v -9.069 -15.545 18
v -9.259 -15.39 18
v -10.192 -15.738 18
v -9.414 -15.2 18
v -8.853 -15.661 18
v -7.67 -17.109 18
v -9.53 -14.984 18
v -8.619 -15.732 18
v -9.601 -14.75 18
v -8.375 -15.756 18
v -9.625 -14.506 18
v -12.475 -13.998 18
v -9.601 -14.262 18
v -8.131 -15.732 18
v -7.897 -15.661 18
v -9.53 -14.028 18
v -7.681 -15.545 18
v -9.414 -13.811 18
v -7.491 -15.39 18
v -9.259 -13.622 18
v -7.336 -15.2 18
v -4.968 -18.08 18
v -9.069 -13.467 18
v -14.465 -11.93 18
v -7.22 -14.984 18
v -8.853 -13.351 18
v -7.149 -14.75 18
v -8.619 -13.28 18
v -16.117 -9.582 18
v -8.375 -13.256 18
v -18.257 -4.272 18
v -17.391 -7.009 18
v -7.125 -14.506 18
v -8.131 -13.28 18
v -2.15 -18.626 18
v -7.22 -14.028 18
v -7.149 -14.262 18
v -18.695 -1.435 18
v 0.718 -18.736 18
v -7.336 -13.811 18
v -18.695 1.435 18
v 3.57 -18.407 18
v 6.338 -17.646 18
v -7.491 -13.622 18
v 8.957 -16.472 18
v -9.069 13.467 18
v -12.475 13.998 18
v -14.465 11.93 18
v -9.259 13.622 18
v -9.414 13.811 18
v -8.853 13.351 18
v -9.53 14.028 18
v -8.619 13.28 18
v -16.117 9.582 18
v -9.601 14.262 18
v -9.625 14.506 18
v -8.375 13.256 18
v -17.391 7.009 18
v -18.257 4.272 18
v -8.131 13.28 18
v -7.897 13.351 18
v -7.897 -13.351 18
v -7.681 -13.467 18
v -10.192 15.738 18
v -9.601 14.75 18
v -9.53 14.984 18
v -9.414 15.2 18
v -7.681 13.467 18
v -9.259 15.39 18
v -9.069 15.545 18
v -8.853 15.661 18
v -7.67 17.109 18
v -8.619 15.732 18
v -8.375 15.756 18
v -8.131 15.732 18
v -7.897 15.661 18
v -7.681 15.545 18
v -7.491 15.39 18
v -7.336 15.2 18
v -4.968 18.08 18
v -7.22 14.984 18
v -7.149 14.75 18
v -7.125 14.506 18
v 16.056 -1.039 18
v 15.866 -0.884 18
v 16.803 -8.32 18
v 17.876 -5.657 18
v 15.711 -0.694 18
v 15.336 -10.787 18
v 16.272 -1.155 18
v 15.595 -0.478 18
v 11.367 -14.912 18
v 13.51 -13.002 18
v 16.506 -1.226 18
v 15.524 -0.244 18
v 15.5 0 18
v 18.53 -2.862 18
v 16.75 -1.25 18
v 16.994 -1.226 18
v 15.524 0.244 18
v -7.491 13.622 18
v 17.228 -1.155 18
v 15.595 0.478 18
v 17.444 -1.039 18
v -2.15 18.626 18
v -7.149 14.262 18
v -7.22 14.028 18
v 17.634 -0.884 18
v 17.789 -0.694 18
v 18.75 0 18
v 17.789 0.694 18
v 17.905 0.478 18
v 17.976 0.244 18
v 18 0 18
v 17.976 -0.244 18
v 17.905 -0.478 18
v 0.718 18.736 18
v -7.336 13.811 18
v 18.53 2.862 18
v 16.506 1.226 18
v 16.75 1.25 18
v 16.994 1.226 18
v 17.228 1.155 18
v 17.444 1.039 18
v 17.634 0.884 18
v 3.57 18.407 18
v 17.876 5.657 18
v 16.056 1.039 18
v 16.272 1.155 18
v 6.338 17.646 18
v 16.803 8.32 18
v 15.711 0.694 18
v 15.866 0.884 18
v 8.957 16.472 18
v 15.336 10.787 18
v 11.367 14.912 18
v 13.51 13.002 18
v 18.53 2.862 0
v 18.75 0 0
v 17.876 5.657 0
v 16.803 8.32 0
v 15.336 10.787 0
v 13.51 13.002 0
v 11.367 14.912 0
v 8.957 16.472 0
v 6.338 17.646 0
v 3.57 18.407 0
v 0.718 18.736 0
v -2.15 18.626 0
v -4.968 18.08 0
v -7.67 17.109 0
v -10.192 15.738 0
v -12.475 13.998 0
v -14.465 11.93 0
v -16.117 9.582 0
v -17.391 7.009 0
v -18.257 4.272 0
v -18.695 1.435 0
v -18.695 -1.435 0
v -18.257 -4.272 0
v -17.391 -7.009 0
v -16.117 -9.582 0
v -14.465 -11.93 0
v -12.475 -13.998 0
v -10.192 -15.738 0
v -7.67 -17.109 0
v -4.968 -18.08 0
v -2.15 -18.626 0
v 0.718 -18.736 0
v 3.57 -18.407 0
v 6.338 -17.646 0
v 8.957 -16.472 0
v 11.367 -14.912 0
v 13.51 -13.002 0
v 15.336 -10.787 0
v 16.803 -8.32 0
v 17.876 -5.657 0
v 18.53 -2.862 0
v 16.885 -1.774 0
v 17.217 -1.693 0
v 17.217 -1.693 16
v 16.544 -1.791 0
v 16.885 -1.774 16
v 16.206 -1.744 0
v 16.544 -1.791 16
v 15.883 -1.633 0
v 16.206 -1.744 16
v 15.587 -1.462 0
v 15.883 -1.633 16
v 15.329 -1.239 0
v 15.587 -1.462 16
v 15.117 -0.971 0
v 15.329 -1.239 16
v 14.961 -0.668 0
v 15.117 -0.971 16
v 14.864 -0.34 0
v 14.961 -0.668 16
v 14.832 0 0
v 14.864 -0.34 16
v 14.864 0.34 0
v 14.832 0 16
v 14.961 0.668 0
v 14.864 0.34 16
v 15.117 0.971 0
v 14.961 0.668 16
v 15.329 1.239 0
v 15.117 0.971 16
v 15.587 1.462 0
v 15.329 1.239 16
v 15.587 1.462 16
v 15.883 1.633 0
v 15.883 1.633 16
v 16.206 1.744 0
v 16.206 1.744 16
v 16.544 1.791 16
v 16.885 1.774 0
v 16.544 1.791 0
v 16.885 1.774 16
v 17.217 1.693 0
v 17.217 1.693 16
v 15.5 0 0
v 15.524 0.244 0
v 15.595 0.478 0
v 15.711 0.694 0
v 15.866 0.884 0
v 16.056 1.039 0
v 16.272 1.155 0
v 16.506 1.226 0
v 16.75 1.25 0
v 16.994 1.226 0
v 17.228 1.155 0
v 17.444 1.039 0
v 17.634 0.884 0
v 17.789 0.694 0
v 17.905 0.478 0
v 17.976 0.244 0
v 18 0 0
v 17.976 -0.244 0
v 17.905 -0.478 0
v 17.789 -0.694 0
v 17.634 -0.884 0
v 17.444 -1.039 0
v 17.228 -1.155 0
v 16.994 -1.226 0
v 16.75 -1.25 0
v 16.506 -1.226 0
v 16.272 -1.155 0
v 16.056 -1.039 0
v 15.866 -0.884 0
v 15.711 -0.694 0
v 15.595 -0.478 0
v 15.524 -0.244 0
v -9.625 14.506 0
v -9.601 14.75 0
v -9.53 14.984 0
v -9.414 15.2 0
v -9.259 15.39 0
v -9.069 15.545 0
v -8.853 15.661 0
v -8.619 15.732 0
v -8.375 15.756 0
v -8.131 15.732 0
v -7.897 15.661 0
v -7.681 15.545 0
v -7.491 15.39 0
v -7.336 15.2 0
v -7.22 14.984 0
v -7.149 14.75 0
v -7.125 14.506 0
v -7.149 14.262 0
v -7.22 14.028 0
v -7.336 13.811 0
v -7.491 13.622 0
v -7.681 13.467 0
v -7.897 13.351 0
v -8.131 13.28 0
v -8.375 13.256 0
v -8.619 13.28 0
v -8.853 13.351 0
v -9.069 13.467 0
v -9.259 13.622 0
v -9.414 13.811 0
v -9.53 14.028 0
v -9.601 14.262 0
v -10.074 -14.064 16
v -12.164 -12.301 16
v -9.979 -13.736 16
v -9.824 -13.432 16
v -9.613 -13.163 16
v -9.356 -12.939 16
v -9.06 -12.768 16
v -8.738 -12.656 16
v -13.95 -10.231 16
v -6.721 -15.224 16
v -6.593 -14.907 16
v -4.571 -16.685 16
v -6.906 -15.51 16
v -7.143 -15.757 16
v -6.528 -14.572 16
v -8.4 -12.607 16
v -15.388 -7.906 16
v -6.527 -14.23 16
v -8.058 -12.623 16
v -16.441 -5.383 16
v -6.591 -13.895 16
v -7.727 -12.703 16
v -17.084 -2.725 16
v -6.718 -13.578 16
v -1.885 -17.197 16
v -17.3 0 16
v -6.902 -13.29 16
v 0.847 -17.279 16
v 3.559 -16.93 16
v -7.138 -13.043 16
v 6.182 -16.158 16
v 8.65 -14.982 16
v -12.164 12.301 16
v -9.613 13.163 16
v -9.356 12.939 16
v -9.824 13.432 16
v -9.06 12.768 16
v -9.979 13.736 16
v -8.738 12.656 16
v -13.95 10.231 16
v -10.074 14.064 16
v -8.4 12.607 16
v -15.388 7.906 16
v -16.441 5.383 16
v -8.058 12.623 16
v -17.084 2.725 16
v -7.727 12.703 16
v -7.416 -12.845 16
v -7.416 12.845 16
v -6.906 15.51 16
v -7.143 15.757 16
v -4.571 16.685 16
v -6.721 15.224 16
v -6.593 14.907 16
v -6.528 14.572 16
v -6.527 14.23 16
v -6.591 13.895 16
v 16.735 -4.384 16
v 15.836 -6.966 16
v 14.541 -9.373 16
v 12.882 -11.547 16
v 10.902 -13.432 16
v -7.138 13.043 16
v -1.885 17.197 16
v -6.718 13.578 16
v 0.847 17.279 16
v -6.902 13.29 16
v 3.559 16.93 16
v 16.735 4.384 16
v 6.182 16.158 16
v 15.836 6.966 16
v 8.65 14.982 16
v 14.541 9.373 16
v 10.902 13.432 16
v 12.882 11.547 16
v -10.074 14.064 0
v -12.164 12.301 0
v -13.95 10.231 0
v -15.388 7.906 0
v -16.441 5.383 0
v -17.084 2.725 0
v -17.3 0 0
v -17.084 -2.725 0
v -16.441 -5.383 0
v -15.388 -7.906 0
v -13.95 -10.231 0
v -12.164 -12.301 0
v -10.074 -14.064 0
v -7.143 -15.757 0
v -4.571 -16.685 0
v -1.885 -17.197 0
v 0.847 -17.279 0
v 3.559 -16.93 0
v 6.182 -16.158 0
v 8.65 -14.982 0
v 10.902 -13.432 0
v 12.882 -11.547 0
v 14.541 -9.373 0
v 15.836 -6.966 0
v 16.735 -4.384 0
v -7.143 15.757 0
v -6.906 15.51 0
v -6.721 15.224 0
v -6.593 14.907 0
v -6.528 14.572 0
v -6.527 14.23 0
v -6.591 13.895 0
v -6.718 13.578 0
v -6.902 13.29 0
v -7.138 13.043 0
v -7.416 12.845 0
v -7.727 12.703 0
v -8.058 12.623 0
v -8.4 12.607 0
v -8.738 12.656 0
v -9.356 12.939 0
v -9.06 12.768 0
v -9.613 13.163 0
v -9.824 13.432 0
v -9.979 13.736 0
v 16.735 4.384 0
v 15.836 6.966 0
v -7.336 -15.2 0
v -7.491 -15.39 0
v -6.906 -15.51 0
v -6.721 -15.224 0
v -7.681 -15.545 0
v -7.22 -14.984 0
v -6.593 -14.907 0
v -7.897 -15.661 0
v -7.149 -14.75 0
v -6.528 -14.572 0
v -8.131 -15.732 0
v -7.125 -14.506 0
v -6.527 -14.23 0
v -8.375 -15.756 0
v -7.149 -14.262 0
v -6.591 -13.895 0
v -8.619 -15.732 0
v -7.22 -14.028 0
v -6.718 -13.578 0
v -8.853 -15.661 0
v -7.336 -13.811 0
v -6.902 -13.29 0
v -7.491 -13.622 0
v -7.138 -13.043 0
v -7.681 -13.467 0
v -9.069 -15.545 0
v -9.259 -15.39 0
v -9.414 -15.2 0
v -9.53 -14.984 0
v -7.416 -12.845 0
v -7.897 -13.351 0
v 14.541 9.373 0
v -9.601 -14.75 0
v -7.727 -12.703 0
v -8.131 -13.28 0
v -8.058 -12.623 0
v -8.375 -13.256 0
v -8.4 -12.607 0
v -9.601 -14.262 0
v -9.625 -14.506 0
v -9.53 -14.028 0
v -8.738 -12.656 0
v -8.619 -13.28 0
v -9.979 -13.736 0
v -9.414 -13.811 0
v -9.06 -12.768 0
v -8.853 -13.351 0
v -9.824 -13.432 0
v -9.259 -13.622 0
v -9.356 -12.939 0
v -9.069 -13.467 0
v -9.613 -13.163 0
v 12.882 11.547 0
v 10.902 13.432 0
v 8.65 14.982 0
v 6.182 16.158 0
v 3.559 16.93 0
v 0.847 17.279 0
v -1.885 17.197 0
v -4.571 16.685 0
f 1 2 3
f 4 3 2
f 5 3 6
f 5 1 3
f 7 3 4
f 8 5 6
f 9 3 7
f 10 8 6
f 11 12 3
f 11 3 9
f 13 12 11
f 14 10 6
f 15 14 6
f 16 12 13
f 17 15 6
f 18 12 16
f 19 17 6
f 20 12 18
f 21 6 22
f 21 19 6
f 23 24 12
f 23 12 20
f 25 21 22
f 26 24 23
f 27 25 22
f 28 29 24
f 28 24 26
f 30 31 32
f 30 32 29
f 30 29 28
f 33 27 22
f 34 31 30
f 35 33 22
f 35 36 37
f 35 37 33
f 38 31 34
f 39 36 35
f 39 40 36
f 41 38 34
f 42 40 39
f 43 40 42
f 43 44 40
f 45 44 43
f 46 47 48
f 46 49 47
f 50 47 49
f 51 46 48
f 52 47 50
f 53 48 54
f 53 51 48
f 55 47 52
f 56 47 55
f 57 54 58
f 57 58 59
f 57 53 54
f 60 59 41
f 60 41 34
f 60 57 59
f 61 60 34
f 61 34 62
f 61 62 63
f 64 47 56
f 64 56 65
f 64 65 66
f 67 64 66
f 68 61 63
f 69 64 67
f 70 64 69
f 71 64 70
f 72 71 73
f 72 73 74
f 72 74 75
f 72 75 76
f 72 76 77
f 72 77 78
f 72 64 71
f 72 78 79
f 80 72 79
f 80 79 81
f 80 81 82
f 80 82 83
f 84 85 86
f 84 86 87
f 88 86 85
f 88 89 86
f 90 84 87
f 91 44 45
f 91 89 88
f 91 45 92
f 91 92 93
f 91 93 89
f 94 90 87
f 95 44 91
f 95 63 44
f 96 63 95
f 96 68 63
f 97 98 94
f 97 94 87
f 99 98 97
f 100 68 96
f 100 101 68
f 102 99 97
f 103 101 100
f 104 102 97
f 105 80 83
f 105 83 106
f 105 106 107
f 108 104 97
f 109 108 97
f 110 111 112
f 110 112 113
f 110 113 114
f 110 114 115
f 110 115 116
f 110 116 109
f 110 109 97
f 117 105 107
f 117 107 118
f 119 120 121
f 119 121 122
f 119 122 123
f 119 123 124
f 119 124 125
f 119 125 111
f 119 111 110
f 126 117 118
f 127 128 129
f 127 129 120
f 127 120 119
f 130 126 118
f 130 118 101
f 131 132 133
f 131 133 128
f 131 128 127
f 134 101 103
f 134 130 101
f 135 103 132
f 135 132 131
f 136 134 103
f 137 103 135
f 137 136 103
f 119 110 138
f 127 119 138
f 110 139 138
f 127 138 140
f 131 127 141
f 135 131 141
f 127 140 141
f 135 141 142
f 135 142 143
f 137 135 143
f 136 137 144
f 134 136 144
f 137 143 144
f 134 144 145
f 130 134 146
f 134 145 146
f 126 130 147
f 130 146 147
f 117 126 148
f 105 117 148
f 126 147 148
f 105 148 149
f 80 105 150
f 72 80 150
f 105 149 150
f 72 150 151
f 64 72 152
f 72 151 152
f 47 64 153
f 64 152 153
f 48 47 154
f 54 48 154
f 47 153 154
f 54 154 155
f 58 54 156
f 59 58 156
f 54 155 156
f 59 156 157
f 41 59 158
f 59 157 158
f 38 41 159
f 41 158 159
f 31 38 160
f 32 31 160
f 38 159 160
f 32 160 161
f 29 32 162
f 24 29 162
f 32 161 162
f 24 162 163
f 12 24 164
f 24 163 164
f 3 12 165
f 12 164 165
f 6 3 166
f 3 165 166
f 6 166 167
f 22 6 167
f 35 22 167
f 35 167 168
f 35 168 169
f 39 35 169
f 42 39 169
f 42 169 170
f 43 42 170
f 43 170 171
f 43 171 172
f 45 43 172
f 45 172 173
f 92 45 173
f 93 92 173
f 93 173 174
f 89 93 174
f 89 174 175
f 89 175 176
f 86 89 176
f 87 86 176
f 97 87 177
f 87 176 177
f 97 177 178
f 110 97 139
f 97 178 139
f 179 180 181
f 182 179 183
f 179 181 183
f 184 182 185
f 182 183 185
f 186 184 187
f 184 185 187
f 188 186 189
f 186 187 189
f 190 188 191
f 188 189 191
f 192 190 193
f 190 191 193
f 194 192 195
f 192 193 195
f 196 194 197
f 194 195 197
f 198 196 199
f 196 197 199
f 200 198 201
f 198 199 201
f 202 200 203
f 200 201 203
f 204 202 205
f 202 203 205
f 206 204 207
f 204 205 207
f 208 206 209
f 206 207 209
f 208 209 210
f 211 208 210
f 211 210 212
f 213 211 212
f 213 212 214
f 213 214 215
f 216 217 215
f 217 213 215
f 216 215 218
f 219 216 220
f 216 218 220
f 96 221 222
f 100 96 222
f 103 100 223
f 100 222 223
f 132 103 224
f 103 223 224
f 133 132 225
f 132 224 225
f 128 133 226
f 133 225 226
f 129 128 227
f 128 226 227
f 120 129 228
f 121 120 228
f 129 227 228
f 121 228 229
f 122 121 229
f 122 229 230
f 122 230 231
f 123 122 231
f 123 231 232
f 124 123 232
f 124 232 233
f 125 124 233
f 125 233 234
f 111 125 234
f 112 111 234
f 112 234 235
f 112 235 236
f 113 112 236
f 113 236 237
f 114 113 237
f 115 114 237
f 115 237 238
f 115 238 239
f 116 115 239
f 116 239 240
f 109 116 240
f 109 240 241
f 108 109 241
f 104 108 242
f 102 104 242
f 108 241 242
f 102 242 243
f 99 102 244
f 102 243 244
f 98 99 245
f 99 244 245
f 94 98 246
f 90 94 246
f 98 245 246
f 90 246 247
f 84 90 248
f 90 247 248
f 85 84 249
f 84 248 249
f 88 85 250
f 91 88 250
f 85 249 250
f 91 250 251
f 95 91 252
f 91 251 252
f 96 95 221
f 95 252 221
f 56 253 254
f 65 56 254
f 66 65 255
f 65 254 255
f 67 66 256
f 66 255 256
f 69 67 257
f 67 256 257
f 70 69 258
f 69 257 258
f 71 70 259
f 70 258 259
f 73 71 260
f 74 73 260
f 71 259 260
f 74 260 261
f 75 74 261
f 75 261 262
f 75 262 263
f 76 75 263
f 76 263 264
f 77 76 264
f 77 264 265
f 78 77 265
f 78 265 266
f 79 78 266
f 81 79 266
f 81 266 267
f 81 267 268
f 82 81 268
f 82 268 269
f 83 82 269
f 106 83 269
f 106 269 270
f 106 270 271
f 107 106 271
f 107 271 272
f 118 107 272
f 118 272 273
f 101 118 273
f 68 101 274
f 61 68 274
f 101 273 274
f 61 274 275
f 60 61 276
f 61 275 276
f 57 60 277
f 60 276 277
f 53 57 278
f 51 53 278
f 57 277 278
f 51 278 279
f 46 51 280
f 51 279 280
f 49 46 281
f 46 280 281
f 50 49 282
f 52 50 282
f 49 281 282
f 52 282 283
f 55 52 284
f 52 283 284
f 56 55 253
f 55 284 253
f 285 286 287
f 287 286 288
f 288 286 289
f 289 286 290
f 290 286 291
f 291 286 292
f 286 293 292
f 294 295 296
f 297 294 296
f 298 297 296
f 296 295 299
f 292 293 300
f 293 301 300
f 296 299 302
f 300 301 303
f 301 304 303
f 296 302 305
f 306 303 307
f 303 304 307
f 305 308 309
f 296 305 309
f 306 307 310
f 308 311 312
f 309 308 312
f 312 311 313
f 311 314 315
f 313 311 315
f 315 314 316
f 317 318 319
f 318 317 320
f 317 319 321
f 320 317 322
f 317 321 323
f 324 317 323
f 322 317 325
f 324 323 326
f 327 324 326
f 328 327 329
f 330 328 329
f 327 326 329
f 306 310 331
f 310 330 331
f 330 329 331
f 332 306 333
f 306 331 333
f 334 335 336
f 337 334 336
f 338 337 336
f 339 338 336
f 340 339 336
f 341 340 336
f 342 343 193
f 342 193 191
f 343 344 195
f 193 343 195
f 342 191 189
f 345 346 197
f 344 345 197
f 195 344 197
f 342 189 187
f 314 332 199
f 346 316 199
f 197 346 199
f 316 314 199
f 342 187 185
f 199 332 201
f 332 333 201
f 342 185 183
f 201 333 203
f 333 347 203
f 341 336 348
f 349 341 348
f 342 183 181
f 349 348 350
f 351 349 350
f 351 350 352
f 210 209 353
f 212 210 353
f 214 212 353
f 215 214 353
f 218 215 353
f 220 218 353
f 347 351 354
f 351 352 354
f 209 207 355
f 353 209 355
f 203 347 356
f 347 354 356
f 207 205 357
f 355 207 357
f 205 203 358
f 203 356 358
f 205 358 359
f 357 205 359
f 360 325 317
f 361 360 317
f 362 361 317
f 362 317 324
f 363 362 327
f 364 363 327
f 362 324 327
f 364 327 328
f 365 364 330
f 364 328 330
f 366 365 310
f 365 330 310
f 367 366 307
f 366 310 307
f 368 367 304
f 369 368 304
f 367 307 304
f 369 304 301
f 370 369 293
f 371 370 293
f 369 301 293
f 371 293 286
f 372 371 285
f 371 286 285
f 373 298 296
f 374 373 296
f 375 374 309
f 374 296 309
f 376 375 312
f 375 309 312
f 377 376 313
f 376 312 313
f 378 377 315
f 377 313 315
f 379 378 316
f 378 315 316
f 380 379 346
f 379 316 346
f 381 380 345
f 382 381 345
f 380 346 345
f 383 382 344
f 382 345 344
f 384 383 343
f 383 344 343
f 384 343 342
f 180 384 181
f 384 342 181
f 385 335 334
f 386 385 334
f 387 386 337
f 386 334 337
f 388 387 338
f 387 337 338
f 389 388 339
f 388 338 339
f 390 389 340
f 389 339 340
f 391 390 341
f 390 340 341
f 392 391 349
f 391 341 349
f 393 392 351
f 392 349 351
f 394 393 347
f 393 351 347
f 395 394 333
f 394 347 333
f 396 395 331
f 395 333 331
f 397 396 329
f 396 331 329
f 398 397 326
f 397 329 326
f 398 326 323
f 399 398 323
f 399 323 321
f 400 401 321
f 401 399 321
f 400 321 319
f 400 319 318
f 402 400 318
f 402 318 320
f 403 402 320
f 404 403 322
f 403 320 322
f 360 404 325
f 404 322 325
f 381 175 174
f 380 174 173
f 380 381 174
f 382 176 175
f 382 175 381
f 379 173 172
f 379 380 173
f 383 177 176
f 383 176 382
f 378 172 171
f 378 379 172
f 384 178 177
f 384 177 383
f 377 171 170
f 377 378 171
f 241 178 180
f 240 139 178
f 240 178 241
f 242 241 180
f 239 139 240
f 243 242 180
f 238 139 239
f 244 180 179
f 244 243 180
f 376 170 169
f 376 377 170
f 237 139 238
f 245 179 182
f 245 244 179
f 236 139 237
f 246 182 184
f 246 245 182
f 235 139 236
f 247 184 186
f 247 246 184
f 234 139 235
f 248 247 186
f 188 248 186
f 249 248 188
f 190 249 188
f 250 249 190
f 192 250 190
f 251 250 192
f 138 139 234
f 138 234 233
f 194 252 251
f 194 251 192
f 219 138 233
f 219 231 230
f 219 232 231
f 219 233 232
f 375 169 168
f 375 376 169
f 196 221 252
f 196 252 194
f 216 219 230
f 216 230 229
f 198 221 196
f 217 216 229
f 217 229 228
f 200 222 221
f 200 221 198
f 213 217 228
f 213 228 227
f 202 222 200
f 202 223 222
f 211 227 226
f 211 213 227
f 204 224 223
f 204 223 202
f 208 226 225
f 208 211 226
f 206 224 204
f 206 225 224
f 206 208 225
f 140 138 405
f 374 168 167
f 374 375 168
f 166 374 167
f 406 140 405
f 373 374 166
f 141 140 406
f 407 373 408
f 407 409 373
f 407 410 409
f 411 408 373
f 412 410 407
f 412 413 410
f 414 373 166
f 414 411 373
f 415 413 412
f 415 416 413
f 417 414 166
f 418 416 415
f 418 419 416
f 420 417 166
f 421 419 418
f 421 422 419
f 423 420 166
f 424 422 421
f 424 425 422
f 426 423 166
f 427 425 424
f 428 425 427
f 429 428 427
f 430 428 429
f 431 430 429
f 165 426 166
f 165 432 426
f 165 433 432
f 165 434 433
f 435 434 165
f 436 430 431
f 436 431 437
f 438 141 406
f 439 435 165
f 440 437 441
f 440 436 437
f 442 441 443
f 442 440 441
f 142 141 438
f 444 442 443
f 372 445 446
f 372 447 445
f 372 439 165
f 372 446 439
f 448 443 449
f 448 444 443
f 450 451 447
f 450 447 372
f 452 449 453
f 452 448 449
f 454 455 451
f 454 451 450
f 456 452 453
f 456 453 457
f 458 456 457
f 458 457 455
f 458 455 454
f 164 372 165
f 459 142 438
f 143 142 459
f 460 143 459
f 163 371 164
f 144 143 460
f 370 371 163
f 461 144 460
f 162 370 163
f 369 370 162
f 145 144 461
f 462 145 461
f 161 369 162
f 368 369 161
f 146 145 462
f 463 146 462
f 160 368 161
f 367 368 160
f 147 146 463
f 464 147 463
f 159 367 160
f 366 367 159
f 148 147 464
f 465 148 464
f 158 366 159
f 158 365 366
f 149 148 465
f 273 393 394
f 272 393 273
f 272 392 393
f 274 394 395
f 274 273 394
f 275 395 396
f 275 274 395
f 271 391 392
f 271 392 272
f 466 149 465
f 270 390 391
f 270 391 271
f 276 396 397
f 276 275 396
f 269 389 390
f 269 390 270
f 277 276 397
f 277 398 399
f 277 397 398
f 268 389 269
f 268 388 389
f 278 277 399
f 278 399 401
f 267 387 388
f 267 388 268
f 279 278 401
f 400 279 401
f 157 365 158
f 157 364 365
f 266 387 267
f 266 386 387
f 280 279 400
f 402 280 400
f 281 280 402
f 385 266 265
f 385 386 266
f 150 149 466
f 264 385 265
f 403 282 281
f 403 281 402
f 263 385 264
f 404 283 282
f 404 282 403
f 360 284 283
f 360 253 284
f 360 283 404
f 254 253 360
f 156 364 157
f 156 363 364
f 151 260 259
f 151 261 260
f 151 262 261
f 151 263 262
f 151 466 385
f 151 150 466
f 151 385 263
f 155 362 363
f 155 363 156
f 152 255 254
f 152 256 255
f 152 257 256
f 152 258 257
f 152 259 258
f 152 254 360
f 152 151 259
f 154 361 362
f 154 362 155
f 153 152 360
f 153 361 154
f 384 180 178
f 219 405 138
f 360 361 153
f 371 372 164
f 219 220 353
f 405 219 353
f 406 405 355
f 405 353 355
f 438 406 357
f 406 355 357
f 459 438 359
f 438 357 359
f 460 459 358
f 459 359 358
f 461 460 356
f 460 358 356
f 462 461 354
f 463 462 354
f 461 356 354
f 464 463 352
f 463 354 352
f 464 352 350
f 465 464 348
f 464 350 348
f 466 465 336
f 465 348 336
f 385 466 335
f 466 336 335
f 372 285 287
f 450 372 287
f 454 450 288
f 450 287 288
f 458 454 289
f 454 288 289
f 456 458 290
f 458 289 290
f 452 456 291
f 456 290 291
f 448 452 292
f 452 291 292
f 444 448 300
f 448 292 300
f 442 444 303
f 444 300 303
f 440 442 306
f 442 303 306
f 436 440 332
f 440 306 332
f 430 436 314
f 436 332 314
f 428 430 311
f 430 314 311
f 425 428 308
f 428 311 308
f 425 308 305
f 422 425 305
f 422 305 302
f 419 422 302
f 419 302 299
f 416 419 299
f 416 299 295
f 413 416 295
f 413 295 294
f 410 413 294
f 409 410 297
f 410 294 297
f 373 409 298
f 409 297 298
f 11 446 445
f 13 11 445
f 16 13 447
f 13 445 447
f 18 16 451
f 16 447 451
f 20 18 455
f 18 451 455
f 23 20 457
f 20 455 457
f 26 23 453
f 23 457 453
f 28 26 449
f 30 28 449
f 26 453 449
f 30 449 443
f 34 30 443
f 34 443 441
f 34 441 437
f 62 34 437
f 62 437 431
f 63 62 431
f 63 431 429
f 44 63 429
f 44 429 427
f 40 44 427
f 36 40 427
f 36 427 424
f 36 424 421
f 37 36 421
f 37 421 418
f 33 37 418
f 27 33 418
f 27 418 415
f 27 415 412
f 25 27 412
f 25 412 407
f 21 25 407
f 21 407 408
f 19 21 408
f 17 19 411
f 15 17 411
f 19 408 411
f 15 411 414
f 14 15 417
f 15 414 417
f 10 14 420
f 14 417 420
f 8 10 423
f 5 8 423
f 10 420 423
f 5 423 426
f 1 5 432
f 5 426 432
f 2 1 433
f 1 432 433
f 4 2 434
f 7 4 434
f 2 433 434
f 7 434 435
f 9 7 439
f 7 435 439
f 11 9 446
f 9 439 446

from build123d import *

# Parameters (mm, degrees)
SKETCH_1_R          = 18.75
SKETCH_1_R_2        = 14.5
EXTRUDE_1_DEPTH     = 16
SKETCH_2_R          = 1.25
CUT_EXTRUDE_1_DEPTH = 18
CUT_EXTRUDE_2_DEPTH = 18
SKETCH_4_R          = 18.75
EXTRUDE_2_DEPTH     = 2
SKETCH_6_R          = 1.25
EXTRUDE_3_DEPTH     = 16
SKETCH_7_R          = 1.25
CUT_EXTRUDE_3_DEPTH = 20


with BuildPart() as part:
    # 草图1 → 凸台-拉伸1 (new body)
    with BuildSketch(Plane.XY):
        Circle(SKETCH_1_R)
        Circle(SKETCH_1_R_2, mode=Mode.SUBTRACT)
    extrude(amount=EXTRUDE_1_DEPTH)

    # 草图2 → 切除-拉伸1 (cut)
    with BuildSketch(Plane.XY.offset(16)):
        with Locations((16.625, 0)):
            Circle(SKETCH_2_R)
        with Locations((-8.3125, -14.397672338)):
            Circle(SKETCH_2_R)
        with Locations((-8.3125, 14.397672338)):
            Circle(SKETCH_2_R)
    extrude(amount=-CUT_EXTRUDE_1_DEPTH, mode=Mode.SUBTRACT)

    # 草图3 → 切除-拉伸2 (cut)
    with BuildSketch(Plane.XY.offset(16)):
        with BuildLine():
            ThreePointArc((-7.142590701, -15.756693755), (8.65, -14.982239485), (17.216992422, -1.692681881))
            ThreePointArc((17.216992422, -1.692681881), (14.831783064, 0), (17.216992422, 1.692681881))
            ThreePointArc((17.216992422, 1.692681881), (8.65, 14.982239485), (-7.142590701, 15.756693755))
            ThreePointArc((-7.142590701, 15.756693755), (-7.415891532, 12.844700917), (-10.07440172, 14.064011873))
            ThreePointArc((-10.07440172, 14.064011873), (-17.3, 0), (-10.07440172, -14.064011873))
            ThreePointArc((-10.07440172, -14.064011873), (-7.415891532, -12.844700917), (-7.142590701, -15.756693755))
        make_face()
    extrude(amount=-CUT_EXTRUDE_2_DEPTH, mode=Mode.SUBTRACT)

    # 草图4 → 凸台-拉伸2 (add)
    with BuildSketch(Plane.XY.offset(16)):
        Circle(SKETCH_4_R)
    extrude(amount=EXTRUDE_2_DEPTH)

    # 草图6 → 凸台-拉伸3 (add)
    with BuildSketch(Plane(origin=(0, 0, 0), x_dir=(-1, 0, 0), z_dir=(0, 0, -1))):
        with Locations((8.3125, -14.397672338)):
            Circle(SKETCH_6_R)
        with Locations((-16.625, 0)):
            Circle(SKETCH_6_R)
        with Locations((8.3125, 14.397672338)):
            Circle(SKETCH_6_R)
    extrude(amount=-EXTRUDE_3_DEPTH)

    # 草图7 → 切除-拉伸3 (cut)
    with BuildSketch(Plane(origin=(0, 0, 0), x_dir=(-1, 0, 0), z_dir=(0, 0, -1))):
        with Locations((8.375, 14.505925513)):
            Circle(SKETCH_7_R)
        with Locations((8.375, -14.505925513)):
            Circle(SKETCH_7_R)
        with Locations((-16.75, 0)):
            Circle(SKETCH_7_R)
    extrude(amount=-CUT_EXTRUDE_3_DEPTH, mode=Mode.SUBTRACT)


solid = part.part
